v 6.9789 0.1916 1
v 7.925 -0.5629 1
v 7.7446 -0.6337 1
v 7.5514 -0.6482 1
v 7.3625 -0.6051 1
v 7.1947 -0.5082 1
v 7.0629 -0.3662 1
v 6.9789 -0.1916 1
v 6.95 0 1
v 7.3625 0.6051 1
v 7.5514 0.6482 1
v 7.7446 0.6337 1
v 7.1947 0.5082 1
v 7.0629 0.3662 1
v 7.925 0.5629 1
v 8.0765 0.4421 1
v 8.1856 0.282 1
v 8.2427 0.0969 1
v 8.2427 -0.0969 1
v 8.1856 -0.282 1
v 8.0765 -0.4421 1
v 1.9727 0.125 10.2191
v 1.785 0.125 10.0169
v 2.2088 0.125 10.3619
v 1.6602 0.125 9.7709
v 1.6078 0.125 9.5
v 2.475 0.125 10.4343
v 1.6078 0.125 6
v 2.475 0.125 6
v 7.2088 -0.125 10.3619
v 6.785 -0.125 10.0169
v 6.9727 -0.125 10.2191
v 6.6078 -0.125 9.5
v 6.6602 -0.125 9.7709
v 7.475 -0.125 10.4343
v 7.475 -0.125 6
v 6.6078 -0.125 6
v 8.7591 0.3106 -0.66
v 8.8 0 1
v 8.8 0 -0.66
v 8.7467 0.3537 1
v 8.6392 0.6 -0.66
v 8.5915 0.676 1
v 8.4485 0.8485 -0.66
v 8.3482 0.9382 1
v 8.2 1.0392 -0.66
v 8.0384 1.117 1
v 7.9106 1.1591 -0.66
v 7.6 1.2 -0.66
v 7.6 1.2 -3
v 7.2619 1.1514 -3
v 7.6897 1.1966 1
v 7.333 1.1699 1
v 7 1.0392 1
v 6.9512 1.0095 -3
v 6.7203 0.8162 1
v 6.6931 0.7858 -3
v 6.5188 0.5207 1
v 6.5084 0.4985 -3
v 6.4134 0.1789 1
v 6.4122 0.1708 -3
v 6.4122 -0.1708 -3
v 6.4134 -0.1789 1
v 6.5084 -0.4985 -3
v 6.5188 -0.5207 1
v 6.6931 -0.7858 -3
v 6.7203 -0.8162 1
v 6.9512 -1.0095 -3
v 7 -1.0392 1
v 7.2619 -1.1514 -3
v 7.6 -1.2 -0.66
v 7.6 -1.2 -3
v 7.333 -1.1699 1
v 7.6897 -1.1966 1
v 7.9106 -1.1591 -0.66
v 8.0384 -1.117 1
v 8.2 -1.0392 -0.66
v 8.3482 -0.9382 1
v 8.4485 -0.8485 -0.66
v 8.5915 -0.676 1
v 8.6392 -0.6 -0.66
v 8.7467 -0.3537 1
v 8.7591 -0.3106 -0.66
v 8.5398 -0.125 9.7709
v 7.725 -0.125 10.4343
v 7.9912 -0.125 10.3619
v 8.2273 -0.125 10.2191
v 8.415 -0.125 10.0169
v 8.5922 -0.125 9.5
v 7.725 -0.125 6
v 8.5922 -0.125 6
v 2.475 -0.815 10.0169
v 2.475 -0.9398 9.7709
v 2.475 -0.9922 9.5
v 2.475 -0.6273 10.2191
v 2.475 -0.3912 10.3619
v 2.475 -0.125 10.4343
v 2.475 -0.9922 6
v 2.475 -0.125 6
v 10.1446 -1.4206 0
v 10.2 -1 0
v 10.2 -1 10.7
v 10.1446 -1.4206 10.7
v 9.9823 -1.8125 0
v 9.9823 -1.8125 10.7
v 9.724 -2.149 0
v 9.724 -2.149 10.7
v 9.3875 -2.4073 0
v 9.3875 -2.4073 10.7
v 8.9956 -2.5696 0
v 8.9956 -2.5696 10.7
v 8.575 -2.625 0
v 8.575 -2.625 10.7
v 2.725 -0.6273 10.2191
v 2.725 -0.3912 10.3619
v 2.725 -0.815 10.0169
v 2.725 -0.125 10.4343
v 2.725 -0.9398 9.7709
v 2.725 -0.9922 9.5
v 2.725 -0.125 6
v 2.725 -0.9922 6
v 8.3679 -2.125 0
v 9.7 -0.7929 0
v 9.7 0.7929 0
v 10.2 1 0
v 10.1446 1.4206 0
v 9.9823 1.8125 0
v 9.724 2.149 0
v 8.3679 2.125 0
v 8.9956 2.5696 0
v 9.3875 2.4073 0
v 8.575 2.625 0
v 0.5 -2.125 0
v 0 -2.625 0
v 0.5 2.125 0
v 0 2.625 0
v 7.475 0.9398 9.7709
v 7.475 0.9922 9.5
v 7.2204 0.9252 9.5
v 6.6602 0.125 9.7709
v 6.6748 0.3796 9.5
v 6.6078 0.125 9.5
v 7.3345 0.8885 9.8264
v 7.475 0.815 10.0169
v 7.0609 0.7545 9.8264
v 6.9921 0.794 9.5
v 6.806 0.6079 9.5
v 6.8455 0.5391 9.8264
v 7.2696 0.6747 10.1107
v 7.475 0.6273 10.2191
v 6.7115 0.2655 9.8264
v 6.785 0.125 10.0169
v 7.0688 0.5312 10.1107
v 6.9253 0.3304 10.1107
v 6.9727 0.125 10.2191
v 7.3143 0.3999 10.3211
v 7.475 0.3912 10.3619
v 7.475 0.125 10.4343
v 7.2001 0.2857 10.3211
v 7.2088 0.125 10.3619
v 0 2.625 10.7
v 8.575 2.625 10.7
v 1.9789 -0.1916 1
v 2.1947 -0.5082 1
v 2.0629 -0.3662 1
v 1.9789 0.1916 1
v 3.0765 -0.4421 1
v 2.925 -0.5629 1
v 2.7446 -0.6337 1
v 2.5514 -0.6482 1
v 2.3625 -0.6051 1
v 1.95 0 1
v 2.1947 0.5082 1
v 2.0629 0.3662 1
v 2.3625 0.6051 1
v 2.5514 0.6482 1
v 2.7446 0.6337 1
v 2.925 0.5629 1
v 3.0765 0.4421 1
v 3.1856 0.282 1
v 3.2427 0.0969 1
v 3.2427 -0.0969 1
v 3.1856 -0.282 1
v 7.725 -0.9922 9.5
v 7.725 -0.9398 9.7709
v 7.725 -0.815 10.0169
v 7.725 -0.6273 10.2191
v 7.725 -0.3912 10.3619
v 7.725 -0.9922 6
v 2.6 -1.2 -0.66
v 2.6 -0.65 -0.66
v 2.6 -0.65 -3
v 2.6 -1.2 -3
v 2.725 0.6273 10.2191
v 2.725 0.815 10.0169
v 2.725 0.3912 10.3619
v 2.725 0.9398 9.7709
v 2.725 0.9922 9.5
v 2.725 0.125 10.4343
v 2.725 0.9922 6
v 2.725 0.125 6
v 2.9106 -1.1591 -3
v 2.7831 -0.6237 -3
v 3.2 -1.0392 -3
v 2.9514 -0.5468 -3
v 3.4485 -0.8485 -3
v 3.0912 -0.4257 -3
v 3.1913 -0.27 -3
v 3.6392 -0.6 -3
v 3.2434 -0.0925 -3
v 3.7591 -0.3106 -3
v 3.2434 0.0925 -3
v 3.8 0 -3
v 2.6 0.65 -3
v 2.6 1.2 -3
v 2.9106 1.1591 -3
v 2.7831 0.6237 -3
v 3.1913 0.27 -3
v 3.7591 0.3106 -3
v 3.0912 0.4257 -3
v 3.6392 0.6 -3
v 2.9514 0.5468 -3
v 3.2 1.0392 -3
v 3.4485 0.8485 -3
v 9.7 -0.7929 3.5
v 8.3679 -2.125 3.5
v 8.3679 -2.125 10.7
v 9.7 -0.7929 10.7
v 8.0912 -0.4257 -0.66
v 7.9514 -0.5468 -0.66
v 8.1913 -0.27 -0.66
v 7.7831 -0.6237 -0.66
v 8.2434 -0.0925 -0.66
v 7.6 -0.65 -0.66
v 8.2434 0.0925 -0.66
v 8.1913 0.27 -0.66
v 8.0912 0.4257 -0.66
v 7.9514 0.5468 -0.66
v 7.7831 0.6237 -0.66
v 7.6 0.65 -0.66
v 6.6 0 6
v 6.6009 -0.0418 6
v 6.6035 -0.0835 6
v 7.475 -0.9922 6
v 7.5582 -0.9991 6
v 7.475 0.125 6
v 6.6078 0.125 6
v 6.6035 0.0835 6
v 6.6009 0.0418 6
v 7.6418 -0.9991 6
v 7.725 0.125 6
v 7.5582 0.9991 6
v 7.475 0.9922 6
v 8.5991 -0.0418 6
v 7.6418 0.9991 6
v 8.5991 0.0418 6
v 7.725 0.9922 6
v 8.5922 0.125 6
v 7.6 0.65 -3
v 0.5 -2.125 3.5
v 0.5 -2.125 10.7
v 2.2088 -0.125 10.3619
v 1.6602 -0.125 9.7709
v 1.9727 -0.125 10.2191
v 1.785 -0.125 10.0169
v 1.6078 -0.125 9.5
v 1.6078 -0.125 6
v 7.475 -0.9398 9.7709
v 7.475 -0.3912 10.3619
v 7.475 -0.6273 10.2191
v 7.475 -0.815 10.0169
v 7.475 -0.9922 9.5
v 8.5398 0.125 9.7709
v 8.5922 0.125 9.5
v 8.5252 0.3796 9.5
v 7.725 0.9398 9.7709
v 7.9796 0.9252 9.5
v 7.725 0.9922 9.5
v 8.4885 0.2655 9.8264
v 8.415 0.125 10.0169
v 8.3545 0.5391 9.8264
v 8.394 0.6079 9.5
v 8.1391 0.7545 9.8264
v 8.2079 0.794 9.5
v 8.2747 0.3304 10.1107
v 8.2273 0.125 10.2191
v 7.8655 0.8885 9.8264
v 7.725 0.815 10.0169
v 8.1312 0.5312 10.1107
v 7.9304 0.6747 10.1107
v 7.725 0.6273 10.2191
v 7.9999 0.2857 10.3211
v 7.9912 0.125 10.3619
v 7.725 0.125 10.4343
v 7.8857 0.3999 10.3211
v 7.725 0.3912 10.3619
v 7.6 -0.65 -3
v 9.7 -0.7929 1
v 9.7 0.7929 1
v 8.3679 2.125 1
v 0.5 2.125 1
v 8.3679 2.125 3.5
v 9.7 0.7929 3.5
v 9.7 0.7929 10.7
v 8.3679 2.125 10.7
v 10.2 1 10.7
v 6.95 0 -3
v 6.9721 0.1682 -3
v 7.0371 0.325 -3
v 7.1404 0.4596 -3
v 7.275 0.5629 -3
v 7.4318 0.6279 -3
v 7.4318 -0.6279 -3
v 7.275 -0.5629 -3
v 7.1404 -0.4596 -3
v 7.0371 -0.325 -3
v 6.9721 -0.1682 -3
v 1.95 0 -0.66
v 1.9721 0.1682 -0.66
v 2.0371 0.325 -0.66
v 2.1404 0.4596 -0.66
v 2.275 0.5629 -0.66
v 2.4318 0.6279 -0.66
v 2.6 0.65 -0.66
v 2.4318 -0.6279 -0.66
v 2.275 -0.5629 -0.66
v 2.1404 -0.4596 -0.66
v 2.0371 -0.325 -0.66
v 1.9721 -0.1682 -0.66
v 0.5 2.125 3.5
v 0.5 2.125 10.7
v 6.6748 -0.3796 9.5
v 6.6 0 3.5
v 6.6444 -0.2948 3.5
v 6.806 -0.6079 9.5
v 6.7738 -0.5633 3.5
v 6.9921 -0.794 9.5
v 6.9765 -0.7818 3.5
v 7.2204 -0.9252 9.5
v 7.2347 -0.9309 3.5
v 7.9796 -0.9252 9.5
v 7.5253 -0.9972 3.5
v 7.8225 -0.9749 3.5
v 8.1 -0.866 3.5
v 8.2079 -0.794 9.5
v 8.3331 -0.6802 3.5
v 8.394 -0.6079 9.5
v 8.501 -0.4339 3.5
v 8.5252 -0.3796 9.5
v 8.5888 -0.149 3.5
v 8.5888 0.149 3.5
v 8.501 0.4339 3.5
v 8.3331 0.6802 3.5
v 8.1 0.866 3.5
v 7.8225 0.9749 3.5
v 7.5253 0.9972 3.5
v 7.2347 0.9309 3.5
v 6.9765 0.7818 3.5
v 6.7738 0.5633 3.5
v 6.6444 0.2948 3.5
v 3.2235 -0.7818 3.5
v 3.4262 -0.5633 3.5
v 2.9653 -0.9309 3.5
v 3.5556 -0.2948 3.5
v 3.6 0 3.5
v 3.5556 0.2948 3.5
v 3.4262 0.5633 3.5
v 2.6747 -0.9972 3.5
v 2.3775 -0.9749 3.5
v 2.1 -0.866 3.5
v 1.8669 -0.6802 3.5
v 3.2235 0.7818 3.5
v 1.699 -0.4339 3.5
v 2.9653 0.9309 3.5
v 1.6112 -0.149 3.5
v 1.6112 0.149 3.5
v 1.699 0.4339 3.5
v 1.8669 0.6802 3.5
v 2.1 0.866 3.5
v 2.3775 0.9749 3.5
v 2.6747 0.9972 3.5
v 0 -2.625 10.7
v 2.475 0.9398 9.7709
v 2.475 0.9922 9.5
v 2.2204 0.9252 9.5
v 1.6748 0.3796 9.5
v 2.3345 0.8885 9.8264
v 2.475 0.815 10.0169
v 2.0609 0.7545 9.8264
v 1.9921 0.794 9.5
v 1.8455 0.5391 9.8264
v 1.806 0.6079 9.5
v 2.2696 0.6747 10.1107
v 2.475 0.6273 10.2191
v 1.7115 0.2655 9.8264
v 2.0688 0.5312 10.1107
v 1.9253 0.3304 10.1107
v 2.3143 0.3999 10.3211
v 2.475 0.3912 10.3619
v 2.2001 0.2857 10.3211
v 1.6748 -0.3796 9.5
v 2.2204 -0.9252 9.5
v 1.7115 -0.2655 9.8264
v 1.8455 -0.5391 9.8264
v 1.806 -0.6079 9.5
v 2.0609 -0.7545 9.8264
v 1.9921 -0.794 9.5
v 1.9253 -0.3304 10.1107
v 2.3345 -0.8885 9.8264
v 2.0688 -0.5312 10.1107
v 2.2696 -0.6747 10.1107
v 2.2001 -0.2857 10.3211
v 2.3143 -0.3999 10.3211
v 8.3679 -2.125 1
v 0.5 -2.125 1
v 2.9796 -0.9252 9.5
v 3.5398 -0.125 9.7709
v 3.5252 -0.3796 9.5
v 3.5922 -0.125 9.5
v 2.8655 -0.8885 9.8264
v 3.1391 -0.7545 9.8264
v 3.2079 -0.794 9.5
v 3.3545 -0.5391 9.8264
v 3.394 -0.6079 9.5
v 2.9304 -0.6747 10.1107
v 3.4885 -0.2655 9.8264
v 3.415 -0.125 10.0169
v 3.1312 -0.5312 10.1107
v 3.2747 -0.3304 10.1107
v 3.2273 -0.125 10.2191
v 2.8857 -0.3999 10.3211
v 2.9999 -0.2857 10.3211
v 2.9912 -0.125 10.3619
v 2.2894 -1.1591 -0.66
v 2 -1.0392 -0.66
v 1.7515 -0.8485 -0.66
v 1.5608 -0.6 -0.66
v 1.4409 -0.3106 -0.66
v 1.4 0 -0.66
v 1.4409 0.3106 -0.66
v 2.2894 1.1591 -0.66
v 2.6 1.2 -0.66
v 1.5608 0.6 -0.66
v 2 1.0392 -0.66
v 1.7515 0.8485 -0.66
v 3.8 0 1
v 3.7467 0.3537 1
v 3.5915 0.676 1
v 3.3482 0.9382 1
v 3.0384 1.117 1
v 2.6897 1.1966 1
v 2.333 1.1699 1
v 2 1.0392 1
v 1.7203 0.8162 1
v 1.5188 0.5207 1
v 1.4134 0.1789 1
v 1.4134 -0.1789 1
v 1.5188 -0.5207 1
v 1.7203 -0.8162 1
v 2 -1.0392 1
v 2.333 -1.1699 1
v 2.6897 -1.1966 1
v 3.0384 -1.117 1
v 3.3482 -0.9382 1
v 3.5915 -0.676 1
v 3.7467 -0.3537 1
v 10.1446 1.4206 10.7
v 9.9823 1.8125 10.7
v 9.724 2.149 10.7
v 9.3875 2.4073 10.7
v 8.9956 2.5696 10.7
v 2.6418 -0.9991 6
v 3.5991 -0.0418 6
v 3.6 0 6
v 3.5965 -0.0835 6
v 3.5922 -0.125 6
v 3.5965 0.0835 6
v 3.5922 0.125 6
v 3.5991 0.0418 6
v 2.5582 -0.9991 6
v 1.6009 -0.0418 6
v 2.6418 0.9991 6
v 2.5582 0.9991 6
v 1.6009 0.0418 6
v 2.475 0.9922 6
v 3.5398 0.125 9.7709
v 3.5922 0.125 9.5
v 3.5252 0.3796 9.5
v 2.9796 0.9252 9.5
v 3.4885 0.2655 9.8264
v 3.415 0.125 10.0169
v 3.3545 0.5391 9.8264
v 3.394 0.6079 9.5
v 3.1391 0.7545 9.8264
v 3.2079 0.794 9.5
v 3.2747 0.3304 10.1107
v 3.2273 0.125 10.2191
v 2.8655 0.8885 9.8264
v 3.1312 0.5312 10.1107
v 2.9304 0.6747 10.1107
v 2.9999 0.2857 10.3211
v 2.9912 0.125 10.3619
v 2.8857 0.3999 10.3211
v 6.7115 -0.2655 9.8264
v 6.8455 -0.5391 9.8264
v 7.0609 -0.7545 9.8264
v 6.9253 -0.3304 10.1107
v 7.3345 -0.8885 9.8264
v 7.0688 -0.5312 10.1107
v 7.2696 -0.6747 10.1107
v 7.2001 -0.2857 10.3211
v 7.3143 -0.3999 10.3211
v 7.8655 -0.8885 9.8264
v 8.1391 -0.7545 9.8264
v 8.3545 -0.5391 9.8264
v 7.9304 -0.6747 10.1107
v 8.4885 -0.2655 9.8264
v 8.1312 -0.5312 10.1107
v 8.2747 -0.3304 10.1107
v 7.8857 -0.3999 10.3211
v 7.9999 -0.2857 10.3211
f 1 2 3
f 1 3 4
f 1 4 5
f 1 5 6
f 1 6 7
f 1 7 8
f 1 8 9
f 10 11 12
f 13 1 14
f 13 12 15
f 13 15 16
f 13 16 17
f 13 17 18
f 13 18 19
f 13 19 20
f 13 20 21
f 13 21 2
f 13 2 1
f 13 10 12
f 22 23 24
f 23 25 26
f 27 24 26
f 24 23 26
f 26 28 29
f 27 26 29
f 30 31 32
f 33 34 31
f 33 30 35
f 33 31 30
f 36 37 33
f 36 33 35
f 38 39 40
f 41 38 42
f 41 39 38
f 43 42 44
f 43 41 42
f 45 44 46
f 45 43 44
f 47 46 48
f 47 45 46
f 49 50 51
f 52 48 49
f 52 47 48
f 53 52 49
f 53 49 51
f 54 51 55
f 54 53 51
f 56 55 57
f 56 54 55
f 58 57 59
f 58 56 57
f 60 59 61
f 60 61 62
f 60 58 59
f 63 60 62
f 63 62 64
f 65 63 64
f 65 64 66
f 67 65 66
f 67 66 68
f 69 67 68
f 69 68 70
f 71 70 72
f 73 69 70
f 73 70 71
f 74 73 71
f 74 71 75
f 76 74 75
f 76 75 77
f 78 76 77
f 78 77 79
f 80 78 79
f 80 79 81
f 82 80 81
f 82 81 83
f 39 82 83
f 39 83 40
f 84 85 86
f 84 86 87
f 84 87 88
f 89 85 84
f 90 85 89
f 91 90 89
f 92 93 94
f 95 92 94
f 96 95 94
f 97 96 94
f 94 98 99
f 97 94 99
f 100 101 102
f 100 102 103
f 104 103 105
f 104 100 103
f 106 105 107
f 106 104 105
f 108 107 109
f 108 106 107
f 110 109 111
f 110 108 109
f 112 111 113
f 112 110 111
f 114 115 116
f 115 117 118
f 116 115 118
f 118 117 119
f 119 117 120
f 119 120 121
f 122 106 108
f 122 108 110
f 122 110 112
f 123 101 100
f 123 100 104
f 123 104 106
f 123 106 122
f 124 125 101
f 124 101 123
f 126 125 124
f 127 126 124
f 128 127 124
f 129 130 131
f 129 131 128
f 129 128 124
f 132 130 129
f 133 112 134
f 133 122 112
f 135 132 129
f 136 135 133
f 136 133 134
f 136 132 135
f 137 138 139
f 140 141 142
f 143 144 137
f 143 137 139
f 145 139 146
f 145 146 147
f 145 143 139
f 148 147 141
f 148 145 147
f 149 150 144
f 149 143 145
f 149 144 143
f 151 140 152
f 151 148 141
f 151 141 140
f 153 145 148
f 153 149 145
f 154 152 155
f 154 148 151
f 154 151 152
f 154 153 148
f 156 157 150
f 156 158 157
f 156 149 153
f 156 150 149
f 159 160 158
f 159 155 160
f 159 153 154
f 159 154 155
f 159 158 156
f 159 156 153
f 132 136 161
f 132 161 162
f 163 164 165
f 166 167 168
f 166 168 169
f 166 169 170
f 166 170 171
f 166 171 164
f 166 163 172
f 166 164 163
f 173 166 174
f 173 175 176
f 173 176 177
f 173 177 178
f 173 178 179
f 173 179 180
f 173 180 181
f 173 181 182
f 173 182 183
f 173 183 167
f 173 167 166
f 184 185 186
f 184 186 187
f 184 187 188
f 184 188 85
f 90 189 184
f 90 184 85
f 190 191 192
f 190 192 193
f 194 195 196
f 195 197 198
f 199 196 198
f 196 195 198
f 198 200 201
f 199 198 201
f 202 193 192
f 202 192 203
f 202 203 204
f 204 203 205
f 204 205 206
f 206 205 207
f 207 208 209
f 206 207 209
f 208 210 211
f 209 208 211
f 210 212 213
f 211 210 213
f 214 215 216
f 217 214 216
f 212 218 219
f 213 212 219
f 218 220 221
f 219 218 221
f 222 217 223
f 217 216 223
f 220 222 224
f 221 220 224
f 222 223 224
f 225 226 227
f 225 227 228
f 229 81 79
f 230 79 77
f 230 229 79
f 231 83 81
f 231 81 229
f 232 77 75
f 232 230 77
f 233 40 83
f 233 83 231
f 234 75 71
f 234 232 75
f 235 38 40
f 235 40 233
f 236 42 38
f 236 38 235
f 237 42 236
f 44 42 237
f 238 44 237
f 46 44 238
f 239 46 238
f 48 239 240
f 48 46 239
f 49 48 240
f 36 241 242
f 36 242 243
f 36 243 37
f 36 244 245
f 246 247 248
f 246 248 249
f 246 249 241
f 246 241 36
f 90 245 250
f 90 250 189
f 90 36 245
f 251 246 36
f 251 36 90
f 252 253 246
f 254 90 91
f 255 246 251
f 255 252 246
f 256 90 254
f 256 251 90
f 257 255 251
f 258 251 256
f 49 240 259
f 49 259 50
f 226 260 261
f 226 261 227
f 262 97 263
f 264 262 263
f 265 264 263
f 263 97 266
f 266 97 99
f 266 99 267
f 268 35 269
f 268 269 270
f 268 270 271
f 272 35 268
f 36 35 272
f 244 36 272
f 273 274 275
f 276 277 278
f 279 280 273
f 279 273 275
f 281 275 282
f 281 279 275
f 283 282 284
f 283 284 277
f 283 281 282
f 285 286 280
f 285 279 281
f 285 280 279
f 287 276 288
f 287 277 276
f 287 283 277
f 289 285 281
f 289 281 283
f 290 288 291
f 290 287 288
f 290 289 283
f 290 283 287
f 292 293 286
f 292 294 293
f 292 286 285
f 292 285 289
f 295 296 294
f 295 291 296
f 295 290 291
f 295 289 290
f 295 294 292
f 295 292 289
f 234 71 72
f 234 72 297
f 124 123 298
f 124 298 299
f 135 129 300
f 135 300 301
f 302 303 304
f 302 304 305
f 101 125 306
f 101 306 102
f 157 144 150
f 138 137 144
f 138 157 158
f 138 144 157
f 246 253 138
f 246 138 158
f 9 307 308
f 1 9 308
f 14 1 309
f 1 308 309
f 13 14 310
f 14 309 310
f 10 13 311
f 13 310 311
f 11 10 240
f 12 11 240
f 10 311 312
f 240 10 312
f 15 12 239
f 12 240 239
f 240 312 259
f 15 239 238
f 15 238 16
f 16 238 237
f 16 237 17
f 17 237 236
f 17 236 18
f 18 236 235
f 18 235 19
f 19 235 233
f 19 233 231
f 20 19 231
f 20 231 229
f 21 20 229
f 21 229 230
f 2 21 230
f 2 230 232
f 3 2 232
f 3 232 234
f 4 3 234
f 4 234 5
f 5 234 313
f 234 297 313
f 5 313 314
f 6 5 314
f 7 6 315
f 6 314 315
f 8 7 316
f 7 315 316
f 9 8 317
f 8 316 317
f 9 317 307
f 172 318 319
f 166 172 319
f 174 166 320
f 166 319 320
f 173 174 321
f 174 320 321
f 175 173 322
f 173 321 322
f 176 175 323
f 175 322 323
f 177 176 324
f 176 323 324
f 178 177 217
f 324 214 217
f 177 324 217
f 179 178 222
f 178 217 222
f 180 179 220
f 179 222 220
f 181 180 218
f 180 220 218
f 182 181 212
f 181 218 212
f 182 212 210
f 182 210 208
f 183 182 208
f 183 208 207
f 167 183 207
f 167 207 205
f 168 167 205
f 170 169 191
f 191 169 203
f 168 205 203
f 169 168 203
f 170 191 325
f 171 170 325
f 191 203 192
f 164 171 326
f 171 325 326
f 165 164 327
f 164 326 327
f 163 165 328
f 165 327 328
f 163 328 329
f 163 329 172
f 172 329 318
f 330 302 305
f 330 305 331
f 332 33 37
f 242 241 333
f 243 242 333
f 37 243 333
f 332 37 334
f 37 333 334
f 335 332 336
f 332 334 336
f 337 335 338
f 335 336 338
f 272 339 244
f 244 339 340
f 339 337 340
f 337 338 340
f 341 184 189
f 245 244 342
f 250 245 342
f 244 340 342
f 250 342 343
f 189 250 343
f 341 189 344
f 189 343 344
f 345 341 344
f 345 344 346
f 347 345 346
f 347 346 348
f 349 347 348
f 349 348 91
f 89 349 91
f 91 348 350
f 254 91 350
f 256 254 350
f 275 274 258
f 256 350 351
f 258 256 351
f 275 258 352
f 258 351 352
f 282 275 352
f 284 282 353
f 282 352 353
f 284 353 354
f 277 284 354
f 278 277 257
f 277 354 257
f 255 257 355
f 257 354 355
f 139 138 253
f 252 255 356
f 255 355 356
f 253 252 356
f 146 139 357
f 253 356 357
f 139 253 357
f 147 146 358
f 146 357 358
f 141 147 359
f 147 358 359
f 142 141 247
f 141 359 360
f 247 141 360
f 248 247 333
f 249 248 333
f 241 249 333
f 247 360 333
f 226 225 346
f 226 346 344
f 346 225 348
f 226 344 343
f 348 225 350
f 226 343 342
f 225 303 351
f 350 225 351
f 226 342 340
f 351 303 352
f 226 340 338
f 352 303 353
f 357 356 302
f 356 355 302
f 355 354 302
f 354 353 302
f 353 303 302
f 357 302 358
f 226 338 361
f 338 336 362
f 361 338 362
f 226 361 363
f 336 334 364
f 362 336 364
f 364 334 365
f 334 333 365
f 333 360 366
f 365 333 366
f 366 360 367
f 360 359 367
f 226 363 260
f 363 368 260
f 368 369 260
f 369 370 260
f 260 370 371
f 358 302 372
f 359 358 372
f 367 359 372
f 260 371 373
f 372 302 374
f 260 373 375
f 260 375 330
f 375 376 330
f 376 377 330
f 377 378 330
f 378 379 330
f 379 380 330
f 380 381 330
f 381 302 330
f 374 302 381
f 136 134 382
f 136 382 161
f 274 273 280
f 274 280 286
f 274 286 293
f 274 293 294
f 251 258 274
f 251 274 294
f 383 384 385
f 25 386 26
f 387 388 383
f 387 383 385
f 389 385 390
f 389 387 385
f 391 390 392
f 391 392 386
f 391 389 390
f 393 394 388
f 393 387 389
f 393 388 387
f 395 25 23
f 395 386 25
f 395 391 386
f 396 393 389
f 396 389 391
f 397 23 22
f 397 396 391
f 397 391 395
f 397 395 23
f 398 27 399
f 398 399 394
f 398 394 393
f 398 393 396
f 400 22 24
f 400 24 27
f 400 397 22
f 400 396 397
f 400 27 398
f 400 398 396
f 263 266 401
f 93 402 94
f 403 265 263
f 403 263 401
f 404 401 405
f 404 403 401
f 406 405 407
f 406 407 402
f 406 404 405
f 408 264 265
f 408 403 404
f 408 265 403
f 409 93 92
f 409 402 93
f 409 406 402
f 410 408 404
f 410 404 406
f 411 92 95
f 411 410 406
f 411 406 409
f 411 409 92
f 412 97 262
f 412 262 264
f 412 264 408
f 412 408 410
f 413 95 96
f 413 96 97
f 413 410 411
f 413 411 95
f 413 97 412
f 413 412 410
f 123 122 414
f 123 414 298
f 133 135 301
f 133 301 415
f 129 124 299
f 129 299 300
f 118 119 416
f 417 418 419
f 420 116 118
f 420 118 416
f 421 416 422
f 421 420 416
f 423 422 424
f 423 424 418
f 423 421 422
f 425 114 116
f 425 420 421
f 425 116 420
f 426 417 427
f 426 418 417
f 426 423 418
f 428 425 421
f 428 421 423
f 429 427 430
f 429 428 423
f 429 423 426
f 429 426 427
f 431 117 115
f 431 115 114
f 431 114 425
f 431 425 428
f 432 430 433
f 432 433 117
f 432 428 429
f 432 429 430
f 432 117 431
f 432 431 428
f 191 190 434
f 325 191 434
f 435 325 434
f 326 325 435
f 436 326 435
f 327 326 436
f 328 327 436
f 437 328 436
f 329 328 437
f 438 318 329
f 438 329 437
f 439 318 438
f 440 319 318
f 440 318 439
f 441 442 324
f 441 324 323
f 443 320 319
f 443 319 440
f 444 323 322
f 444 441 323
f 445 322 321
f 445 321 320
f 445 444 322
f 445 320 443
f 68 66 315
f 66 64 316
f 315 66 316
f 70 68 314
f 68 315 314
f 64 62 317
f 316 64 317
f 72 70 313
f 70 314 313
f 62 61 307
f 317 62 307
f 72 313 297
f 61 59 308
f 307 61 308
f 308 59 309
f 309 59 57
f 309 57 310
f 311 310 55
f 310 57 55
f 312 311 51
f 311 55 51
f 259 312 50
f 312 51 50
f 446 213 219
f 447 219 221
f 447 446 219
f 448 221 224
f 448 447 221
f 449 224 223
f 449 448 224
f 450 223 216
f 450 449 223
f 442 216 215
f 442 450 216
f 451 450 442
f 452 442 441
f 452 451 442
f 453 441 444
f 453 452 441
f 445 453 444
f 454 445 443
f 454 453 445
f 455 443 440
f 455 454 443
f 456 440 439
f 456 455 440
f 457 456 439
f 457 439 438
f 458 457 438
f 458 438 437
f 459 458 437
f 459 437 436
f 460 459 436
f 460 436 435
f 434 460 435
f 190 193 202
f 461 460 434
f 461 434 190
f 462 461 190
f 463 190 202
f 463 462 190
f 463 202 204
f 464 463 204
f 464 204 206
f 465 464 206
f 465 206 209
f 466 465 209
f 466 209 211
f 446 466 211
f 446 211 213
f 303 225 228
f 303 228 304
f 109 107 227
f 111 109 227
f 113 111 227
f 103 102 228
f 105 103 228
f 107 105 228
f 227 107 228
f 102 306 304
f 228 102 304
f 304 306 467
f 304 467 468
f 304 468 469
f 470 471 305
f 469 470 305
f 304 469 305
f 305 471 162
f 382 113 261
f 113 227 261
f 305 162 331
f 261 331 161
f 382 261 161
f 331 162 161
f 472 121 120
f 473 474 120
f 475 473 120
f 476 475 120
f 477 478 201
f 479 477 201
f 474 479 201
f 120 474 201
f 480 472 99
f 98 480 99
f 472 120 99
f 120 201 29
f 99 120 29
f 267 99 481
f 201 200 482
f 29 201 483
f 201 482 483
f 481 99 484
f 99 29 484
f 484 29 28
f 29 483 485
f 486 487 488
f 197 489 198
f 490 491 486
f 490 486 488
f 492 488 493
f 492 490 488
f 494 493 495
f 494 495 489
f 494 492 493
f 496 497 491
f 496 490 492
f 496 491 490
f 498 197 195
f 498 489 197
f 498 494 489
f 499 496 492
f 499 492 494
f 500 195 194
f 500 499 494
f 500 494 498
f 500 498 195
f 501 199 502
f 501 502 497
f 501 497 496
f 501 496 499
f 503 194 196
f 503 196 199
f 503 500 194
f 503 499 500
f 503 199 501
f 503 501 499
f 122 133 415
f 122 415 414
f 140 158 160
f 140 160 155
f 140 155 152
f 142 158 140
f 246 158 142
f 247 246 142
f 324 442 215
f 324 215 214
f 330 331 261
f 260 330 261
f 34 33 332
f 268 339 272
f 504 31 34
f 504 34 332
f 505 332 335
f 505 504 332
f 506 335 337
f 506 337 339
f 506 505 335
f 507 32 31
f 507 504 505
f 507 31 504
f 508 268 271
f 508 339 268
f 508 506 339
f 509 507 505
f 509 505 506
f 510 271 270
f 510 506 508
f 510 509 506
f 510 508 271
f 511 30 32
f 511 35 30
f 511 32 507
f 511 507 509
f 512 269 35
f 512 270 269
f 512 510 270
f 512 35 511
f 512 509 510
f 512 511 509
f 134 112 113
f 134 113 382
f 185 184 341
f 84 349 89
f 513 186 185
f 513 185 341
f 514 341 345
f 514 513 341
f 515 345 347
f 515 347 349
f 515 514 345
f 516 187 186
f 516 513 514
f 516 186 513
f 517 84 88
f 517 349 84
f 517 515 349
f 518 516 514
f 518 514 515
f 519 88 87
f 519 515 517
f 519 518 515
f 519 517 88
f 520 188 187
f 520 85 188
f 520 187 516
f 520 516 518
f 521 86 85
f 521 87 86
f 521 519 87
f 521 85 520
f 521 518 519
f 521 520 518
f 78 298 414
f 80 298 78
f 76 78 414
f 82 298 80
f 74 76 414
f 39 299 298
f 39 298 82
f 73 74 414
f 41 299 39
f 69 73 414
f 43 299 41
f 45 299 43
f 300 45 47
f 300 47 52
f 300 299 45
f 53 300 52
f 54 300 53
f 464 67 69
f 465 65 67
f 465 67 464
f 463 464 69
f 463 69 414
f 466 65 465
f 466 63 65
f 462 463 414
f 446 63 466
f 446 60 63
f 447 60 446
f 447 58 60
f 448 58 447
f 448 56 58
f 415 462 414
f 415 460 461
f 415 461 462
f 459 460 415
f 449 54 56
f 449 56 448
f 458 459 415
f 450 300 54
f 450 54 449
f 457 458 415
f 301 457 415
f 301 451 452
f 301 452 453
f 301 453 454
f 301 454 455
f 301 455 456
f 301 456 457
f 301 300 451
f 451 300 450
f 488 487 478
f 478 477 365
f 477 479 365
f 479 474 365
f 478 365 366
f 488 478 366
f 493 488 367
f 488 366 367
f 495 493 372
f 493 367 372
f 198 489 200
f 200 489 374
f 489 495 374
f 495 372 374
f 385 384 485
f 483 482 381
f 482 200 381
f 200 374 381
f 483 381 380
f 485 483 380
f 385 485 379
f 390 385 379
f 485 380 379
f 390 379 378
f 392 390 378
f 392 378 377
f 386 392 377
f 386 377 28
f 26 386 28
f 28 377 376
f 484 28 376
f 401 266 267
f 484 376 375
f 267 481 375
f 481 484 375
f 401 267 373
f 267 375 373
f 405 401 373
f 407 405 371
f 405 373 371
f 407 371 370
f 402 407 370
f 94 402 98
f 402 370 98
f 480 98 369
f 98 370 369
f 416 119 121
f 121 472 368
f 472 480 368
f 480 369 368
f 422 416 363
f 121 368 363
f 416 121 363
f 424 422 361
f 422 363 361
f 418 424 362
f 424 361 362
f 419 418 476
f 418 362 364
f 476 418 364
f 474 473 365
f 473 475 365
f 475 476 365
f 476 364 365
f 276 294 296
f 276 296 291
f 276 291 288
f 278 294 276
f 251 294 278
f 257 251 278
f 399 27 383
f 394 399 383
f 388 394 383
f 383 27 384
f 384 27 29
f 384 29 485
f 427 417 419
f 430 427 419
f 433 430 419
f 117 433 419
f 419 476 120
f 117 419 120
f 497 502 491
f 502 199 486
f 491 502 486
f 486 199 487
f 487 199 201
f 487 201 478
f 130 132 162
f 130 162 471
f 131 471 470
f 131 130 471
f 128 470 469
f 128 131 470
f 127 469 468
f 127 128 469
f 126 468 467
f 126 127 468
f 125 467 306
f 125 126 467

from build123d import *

# Parameters (mm, degrees)
BOSS_EXTRUDE1_DEPTH   = 10.7
SKETCH1_4_R           = 1
BOSS_EXTRUDE5_DEPTH   = 9.5
BOSS_EXTRUDE5_2_DEPTH = 9.5
BOSS_EXTRUDE3_DEPTH   = 2.5
DOME1_FACE_RADIUS     = 1
DOME1_HEIGHT          = 0.95
DOME2_FACE_RADIUS     = 1
DOME2_HEIGHT          = 0.95
CUT_EXTRUDE1_DEPTH    = 13.121494339
SKETCH5_R             = 1.2
BOSS_EXTRUDE6_DEPTH   = 6.5
SKETCH6_R             = 0.65
CUT_EXTRUDE2_DEPTH    = 4
CUT_EXTRUDE3_START    = -2.34
CUT_EXTRUDE3_DEPTH    = 2.34


with BuildPart() as part:
    # Sketch1 → Boss-Extrude1 (new body)
    with BuildSketch(Plane.XY):
        with BuildLine():
            Line((0, -2.625), (0, 2.625))
            Line((0, 2.625), (8.575, 2.625))
            ThreePointArc((8.575, 2.625), (9.724048519, 2.149048519), (10.2, 1))
            Line((10.2, 1), (10.2, -1))
            ThreePointArc((10.2, -1), (9.724048519, -2.149048519), (8.575, -2.625))
            Line((8.575, -2.625), (0, -2.625))
        make_face()
        Polygon((0.5, -2.125), (8.367893219, -2.125), (9.7, -0.792893219), (9.7, 0.792893219), (8.367893219, 2.125), (0.5, 2.125), align=None, mode=Mode.SUBTRACT)
    extrude(amount=BOSS_EXTRUDE1_DEPTH)

    # Sketch3 → Boss-Extrude3 (add)
    with BuildSketch(Plane(origin=(0, 0, 1), x_dir=(-1, 0, 0), z_dir=(0, 0, -1))):
        Polygon((-0.5, -2.125), (-0.5, 2.125), (-8.367893219, 2.125), (-9.7, 0.792893219), (-9.7, -0.792893219), (-8.367893219, -2.125), align=None)
    extrude(amount=-BOSS_EXTRUDE3_DEPTH)



with BuildPart() as body_2:
    # Sketch1<4> → Boss-Extrude5 (new body)
    with BuildSketch(Plane.XY):
        with Locations((2.6, 0)):
            Circle(SKETCH1_4_R)
    extrude(amount=BOSS_EXTRUDE5_DEPTH)

    # Dome2: a dome of height H over a round flat face of radius A is a cap of a sphere of radius (A * A + H * H) / (2 * H)
    dome2_r = (DOME2_FACE_RADIUS * DOME2_FACE_RADIUS + DOME2_HEIGHT * DOME2_HEIGHT) / (2 * DOME2_HEIGHT)
    dome2_base = Plane((2.6, 0, 9.5), z_dir=(0, 0, 1))
    with Locations(dome2_base.offset(DOME2_HEIGHT - dome2_r)):
        dome2_ball = Sphere(dome2_r, mode=Mode.PRIVATE)
    add(split(dome2_ball, bisect_by=dome2_base, keep=Keep.TOP, mode=Mode.PRIVATE))


with BuildPart() as body_3:
    # Sketch1<4> → Boss-Extrude5 2 (new body)
    with BuildSketch(Plane.XY):
        with Locations(Location((7.6, 0, 0), (0, 0, 180))):
            Circle(SKETCH1_4_R)
    extrude(amount=BOSS_EXTRUDE5_2_DEPTH)

    # Dome1: a dome of height H over a round flat face of radius A is a cap of a sphere of radius (A * A + H * H) / (2 * H)
    dome1_r = (DOME1_FACE_RADIUS * DOME1_FACE_RADIUS + DOME1_HEIGHT * DOME1_HEIGHT) / (2 * DOME1_HEIGHT)
    dome1_base = Plane((7.6, 0, 9.5), z_dir=(0, 0, 1))
    with Locations(dome1_base.offset(DOME1_HEIGHT - dome1_r)):
        dome1_ball = Sphere(dome1_r, mode=Mode.PRIVATE)
    add(split(dome1_ball, bisect_by=dome1_base, keep=Keep.TOP, mode=Mode.PRIVATE))


with BuildPart() as cut_extrude1_tool:
    # Sketch4 → Cut-Extrude1 (new, through all)
    with BuildSketch(Plane.XY.offset(6)):
        with BuildLine():
            Line((7.475, 0.992156742), (7.475, 0.125))
            Line((7.475, 0.125), (6.607843258, 0.125))
            ThreePointArc((6.607843258, 0.125), (6.6, 0), (6.607843258, -0.125))
            Line((6.607843258, -0.125), (7.475, -0.125))
            Line((7.475, -0.125), (7.475, -0.992156742))
            ThreePointArc((7.475, -0.992156742), (7.6, -1), (7.725, -0.992156742))
            Line((7.725, -0.992156742), (7.725, -0.125))
            Line((7.725, -0.125), (8.592156742, -0.125))
            ThreePointArc((8.592156742, -0.125), (8.6, 0), (8.592156742, 0.125))
            Line((8.592156742, 0.125), (7.725, 0.125))
            Line((7.725, 0.125), (7.725, 0.992156742))
            ThreePointArc((7.725, 0.992156742), (7.6, 1), (7.475, 0.992156742))
        make_face()
        with BuildLine():
            Line((3.592156742, -0.125), (2.725, -0.125))
            Line((2.725, -0.125), (2.725, -0.992156742))
            ThreePointArc((2.725, -0.992156742), (2.6, -1), (2.475, -0.992156742))
            Line((2.475, -0.992156742), (2.475, -0.125))
            Line((2.475, -0.125), (1.607843258, -0.125))
            ThreePointArc((1.607843258, -0.125), (1.6, 0), (1.607843258, 0.125))
            Line((1.607843258, 0.125), (2.475, 0.125))
            Line((2.475, 0.125), (2.475, 0.992156742))
            ThreePointArc((2.475, 0.992156742), (2.6, 1), (2.725, 0.992156742))
            Line((2.725, 0.992156742), (2.725, 0.125))
            Line((2.725, 0.125), (3.592156742, 0.125))
            ThreePointArc((3.592156742, 0.125), (3.6, 0), (3.592156742, -0.125))
        make_face()
    extrude(amount=CUT_EXTRUDE1_DEPTH)


with BuildPart() as body_2_1:
    add(body_2.part)

    # Cut-Extrude1: cut by cut_extrude1_tool
    add(cut_extrude1_tool.part, mode=Mode.SUBTRACT)


with BuildPart() as body_3_1:
    add(body_3.part)

    # Cut-Extrude1: cut by cut_extrude1_tool
    add(cut_extrude1_tool.part, mode=Mode.SUBTRACT)


with BuildPart() as part_1:
    add(part.part)

    add(body_2_1.part)  # Boss-Extrude6 merges body 2

    add(body_3_1.part)  # Boss-Extrude6 merges body 3
    # Sketch5 → Boss-Extrude6 (add)
    with BuildSketch(Plane.XY.offset(3.5)):
        with Locations((7.6, 0)):
            Circle(SKETCH5_R)
        with Locations((2.6, 0)):
            Circle(SKETCH5_R)
    extrude(amount=-BOSS_EXTRUDE6_DEPTH)

    # Sketch6 → Cut-Extrude2 (cut)
    with BuildSketch(Plane(origin=(0, 0, -3), x_dir=(-1, 0, 0), z_dir=(0, 0, -1))):
        with Locations((-2.6, 0)):
            Circle(SKETCH6_R)
        with Locations((-7.6, 0)):
            Circle(SKETCH6_R)
    extrude(amount=-CUT_EXTRUDE2_DEPTH, mode=Mode.SUBTRACT)

    # Sketch7 → Cut-Extrude3 (cut)
    with BuildSketch(Plane(origin=(0, 0, -3), x_dir=(-1, 0, 0), z_dir=(0, 0, -1)).offset(CUT_EXTRUDE3_START)):
        with BuildLine():
            Line((-2.6, -0.65), (-2.6, -1.2))
            ThreePointArc((-2.6, -1.2), (-1.751471863, -0.848528137), (-1.4, 0))
            ThreePointArc((-1.4, 0), (-1.751471863, 0.848528137), (-2.6, 1.2))
            Line((-2.6, 1.2), (-2.6, 0.65))
            ThreePointArc((-2.6, 0.65), (-2.140380592, 0.459619408), (-1.95, 0))
            ThreePointArc((-1.95, 0), (-2.140380592, -0.459619408), (-2.6, -0.65))
        make_face()
        with BuildLine():
            ThreePointArc((-7.6, 1.2), (-8.8, 0), (-7.6, -1.2))
            Line((-7.6, -1.2), (-7.6, 1.2))
        make_face()
    extrude(amount=CUT_EXTRUDE3_DEPTH, mode=Mode.SUBTRACT)


solid = part_1.part
